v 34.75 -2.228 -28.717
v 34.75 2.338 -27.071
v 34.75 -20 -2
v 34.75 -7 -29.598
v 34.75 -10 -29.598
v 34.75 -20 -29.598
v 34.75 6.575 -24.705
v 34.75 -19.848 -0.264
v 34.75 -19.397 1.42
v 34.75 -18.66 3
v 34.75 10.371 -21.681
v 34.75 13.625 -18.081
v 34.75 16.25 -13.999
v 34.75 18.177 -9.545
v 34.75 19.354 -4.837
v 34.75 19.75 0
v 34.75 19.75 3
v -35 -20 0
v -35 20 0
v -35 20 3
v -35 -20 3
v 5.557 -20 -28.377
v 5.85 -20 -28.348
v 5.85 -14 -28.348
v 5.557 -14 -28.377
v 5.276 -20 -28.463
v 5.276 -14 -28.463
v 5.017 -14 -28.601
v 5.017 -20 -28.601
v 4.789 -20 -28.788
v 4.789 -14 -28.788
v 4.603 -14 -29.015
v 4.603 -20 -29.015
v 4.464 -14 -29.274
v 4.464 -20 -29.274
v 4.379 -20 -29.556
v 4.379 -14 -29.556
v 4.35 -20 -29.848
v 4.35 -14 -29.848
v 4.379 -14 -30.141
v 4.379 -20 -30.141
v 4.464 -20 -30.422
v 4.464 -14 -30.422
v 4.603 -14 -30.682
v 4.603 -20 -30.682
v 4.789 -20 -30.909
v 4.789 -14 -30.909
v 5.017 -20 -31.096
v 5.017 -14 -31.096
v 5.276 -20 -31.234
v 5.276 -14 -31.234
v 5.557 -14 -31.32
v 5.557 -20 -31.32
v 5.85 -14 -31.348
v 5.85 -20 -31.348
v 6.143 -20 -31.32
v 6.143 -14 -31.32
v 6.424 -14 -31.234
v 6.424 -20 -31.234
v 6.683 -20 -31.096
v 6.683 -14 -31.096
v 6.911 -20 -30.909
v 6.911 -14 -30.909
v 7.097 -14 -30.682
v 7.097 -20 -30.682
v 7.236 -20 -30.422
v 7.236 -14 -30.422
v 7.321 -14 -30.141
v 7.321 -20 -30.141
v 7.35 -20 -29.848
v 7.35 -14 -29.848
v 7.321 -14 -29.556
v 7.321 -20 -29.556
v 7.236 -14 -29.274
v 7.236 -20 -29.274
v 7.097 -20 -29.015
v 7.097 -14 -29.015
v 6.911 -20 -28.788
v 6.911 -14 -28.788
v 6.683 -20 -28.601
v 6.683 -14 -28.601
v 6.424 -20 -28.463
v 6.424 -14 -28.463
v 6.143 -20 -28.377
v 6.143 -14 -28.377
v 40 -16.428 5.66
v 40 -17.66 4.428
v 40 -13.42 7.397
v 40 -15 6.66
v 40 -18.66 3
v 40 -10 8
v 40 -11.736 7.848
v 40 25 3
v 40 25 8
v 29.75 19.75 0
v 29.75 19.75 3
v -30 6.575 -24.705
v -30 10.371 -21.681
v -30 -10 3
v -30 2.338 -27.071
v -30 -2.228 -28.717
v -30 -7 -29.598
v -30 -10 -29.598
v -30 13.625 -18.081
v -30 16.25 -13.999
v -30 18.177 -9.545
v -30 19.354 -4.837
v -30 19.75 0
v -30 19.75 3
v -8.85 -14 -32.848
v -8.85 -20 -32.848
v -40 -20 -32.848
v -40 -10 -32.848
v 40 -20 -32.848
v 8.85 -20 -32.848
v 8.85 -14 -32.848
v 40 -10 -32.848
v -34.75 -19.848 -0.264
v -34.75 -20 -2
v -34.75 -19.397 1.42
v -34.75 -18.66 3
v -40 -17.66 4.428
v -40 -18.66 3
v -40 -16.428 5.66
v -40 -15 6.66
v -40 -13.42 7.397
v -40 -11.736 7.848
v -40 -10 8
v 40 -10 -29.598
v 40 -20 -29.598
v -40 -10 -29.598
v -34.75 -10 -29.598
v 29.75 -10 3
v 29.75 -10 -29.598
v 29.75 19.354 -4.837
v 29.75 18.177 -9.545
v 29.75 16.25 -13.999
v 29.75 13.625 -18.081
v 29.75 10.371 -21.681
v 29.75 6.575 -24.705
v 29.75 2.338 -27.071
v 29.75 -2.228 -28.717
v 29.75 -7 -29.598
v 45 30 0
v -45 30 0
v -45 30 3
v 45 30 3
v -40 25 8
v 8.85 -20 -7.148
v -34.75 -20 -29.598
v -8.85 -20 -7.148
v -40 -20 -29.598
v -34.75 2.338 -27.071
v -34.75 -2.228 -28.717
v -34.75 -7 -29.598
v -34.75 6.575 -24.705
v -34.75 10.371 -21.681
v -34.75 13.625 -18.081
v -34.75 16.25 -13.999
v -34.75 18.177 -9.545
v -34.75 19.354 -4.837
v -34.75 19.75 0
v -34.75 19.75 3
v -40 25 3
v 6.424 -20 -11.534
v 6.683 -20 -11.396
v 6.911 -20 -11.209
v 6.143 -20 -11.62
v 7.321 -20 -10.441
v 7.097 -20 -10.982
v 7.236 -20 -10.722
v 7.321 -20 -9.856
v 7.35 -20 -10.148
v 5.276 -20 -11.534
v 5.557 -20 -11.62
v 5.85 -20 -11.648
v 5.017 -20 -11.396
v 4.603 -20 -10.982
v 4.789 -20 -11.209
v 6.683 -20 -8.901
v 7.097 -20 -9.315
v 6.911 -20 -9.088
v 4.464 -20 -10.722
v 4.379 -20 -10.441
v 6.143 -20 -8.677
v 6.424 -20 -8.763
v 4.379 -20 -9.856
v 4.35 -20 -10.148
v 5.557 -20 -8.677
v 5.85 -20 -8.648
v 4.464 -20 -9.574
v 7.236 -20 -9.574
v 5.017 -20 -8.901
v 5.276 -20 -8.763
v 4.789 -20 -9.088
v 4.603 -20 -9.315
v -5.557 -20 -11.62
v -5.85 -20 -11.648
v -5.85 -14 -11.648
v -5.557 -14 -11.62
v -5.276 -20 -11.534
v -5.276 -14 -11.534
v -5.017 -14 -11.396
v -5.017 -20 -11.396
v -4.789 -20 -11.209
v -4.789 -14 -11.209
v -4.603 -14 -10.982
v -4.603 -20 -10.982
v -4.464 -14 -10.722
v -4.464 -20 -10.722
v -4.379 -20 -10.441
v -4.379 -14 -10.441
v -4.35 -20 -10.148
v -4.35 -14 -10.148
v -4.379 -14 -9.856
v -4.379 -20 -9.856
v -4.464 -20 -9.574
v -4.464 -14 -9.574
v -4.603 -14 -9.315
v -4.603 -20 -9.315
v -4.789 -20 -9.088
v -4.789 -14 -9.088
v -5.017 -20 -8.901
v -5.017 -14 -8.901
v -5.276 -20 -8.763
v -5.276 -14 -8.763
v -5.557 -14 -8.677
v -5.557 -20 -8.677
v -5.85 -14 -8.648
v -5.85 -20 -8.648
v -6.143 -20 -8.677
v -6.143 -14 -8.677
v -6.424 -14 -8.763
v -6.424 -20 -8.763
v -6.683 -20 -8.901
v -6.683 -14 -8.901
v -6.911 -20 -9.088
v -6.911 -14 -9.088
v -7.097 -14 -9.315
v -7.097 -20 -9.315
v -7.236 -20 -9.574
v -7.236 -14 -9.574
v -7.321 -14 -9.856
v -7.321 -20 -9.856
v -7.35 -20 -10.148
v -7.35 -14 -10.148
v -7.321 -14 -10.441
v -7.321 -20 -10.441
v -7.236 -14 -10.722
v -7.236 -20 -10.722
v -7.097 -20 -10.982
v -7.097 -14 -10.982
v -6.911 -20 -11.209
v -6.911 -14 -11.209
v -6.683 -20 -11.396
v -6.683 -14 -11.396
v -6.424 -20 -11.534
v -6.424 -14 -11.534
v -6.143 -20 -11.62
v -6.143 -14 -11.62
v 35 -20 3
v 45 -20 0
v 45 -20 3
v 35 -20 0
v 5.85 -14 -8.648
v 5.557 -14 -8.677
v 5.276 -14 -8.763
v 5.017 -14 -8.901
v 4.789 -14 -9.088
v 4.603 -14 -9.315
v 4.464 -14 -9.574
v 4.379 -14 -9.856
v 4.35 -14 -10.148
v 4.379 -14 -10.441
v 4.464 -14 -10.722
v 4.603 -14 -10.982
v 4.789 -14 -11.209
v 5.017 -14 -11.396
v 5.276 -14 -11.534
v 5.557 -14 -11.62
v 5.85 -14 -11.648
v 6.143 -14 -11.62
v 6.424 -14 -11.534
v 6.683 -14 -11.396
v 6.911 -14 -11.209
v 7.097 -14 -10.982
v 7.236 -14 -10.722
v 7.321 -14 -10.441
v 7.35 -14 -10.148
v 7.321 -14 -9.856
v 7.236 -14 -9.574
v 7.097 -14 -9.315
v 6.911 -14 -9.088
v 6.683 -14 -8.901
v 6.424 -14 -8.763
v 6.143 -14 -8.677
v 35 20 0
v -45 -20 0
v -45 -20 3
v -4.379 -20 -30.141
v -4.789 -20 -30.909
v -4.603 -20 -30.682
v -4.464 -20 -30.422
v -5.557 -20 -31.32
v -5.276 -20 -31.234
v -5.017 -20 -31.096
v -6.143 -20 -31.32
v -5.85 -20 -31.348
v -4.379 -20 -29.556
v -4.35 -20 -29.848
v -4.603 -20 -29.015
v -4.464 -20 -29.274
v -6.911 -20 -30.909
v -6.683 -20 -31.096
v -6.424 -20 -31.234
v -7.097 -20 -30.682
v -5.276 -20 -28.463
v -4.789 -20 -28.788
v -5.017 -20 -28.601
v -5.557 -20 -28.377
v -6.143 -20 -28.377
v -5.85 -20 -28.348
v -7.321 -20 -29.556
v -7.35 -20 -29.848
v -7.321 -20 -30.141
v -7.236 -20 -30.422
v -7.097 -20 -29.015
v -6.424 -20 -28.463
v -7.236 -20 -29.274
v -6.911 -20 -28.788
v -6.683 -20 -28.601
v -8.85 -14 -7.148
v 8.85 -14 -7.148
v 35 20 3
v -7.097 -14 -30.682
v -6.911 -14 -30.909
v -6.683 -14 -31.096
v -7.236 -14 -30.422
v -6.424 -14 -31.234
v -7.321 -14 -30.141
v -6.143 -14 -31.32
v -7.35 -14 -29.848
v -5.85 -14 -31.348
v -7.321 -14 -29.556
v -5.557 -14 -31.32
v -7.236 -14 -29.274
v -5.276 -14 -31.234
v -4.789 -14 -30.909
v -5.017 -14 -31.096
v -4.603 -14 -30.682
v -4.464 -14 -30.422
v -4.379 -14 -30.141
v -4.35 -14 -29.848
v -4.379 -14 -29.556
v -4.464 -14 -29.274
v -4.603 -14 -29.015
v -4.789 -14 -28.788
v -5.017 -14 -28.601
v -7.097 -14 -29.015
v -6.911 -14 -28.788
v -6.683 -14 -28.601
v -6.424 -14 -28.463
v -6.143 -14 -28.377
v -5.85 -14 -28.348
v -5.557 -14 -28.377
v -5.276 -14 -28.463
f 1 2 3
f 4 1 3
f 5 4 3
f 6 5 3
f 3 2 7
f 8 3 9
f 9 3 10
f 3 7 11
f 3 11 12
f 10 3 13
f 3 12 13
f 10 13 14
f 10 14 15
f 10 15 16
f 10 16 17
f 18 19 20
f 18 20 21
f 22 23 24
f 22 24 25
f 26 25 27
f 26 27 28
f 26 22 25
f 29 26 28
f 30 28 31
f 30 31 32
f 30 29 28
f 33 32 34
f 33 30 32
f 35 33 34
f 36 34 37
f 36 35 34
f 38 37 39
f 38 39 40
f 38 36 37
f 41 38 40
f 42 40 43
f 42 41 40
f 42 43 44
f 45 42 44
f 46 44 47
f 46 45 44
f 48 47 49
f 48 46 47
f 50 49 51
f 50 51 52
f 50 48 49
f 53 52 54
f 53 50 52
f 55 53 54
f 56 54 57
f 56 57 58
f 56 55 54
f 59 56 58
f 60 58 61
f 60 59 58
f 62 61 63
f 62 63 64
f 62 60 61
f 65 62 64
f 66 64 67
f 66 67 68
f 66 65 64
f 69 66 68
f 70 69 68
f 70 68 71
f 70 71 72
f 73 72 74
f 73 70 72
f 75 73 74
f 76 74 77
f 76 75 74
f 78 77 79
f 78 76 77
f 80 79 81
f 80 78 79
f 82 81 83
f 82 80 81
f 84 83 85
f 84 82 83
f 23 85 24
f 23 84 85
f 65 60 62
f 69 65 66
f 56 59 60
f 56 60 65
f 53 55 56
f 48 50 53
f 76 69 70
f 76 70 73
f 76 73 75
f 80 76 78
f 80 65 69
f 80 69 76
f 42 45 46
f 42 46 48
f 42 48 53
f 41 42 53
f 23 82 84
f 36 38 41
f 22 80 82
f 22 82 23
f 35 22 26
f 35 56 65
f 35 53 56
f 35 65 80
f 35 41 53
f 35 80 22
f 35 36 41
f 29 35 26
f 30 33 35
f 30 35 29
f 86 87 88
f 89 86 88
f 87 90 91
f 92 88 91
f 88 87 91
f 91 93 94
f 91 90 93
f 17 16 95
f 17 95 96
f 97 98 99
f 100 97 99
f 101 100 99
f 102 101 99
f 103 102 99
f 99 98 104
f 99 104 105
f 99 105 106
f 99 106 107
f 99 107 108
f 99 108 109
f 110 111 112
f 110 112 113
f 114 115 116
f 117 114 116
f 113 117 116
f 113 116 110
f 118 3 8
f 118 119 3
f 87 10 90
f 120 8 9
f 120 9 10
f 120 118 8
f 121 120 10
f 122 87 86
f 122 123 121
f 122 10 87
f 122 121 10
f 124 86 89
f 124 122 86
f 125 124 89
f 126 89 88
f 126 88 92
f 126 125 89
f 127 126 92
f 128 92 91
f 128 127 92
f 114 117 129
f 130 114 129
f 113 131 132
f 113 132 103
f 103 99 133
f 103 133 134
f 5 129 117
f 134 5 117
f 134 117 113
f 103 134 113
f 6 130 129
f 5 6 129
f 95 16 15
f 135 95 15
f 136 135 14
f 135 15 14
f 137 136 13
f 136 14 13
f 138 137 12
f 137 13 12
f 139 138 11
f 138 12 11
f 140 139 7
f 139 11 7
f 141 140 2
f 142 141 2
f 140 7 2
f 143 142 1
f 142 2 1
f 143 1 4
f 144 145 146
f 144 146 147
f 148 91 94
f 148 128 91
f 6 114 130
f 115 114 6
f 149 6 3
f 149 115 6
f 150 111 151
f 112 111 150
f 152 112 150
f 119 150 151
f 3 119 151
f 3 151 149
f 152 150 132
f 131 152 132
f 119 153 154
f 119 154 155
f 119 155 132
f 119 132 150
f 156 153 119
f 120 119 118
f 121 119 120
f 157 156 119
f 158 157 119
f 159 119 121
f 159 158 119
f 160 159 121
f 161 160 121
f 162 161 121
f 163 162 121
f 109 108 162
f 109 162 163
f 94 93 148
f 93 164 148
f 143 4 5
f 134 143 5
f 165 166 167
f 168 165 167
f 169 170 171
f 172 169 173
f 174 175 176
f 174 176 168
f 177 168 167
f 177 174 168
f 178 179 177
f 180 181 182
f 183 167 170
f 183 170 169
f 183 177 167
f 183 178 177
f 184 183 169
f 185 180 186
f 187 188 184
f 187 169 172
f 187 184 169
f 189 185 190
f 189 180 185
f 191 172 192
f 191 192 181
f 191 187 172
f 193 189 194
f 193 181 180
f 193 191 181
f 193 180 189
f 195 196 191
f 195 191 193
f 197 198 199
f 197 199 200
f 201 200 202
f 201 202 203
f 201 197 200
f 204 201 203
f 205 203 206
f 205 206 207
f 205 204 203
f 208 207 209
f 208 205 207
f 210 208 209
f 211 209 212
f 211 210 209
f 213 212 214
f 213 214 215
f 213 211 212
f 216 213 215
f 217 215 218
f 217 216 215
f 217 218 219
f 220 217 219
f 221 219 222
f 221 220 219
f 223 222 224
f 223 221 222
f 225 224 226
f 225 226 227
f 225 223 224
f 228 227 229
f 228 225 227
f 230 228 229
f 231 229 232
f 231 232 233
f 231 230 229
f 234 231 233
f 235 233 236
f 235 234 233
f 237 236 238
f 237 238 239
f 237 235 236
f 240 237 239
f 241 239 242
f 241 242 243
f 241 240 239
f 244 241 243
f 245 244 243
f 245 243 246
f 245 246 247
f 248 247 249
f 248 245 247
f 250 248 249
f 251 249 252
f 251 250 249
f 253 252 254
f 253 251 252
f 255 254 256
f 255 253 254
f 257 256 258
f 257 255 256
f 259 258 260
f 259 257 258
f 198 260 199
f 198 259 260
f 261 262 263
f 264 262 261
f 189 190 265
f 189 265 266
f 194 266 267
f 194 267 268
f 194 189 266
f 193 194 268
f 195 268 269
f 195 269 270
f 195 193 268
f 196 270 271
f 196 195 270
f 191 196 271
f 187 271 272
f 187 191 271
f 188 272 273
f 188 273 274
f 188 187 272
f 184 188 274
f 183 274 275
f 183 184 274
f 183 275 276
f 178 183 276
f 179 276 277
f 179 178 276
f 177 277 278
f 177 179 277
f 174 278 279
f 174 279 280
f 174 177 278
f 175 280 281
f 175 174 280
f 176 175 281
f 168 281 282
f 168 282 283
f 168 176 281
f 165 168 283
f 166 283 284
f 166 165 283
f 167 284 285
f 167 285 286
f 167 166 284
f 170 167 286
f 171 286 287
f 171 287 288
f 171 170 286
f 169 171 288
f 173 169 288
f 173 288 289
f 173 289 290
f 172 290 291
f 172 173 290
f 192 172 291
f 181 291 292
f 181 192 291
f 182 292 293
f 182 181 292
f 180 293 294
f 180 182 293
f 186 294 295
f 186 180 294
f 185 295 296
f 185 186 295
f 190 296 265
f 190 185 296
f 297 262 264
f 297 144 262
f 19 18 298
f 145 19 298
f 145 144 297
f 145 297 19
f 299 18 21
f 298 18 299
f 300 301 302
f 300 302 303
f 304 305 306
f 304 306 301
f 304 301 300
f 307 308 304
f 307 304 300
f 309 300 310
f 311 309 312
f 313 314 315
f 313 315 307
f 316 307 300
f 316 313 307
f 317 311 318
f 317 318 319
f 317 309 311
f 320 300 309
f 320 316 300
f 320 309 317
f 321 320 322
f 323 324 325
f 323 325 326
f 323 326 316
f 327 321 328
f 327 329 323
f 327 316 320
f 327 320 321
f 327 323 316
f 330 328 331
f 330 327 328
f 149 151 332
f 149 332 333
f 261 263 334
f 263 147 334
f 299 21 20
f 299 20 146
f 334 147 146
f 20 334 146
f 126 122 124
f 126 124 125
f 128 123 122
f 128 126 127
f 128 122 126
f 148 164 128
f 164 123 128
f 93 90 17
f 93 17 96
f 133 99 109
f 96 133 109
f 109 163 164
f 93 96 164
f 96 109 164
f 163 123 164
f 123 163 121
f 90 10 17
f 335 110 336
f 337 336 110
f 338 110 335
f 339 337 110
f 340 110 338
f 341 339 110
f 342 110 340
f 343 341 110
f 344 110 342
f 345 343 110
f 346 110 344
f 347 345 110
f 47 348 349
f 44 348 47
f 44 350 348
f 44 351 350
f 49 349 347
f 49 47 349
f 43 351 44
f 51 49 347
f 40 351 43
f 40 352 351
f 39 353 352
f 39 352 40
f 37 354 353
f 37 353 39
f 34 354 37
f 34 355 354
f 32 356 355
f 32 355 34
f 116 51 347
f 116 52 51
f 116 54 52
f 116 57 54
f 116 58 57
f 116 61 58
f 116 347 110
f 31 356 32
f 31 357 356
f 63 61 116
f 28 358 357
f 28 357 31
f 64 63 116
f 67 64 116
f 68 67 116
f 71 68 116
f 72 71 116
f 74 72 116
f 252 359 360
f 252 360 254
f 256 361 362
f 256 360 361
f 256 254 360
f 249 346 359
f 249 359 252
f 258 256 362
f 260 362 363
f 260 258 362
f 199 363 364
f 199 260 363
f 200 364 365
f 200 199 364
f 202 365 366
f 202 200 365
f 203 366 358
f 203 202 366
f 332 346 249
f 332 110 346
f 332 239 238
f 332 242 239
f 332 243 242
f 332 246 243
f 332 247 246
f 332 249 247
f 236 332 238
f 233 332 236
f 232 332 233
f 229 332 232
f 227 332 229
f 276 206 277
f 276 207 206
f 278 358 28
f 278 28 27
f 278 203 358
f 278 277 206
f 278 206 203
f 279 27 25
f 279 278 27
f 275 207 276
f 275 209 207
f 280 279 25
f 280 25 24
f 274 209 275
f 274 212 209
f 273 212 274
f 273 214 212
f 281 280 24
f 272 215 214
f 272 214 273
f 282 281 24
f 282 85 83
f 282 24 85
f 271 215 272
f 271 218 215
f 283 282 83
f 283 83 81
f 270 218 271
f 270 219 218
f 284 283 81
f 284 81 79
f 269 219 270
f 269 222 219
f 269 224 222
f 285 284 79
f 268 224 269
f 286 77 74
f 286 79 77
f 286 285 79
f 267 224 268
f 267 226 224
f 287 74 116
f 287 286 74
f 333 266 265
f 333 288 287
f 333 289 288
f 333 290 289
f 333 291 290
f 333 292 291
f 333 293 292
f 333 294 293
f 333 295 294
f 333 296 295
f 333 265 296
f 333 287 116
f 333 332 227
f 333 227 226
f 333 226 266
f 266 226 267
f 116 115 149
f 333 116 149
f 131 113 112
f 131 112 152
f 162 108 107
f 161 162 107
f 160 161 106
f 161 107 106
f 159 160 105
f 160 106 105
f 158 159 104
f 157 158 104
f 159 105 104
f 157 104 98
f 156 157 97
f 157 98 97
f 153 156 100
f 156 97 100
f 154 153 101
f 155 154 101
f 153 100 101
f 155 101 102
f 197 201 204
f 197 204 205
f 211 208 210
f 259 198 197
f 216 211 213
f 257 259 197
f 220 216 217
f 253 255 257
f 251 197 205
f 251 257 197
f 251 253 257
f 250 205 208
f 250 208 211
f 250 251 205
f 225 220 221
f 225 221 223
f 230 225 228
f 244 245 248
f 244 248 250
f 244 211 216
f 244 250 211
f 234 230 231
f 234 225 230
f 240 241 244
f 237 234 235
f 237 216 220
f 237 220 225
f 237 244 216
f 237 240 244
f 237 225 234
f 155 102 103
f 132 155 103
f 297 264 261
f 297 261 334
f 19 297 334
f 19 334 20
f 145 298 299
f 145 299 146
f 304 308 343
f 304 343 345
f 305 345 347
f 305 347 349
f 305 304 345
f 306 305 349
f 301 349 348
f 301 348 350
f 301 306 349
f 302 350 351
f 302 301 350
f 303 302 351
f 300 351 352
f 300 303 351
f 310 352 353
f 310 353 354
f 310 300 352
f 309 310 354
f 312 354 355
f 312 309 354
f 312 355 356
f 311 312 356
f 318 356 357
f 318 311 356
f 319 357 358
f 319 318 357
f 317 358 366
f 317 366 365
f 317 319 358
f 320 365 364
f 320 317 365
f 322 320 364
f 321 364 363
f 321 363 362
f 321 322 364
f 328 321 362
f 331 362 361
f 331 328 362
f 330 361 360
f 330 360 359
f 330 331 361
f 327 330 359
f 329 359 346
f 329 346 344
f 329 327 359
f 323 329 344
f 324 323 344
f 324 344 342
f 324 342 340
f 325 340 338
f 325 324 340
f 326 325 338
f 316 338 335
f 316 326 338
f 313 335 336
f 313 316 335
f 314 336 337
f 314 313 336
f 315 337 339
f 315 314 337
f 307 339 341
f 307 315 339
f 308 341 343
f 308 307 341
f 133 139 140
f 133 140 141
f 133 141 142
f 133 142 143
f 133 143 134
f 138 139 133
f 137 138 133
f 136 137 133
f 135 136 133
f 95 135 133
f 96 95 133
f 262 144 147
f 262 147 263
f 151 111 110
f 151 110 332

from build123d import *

# Parameters (mm, degrees)
BOSS_EXTRUDE1_DEPTH      = 3
BOSS_EXTRUDE2_START      = 0.25
SKETCH2_W                = 3
SKETCH2_H                = 29.75
BOSS_EXTRUDE2_DEPTH      = 5
SKETCH2_6_W              = 5
SKETCH2_6_H              = 45
SKETCH2_6_W_2            = 3.25
SKETCH2_6_H_2            = 10
BOSS_EXTRUDE5_DEPTH      = 75
BOSS_EXTRUDE5_DEPTH_BACK = 5
BOSS_EXTRUDE6_START      = 65
SKETCH2_8_W              = 3
SKETCH2_8_H              = 29.75
BOSS_EXTRUDE6_DEPTH      = 4.75
BOSS_EXTRUDE8_START      = 0.25
SKETCH2_9_W              = 3
SKETCH2_9_H              = 10
SKETCH2_9_W_2            = 29.598352995
BOSS_EXTRUDE8_DEPTH      = 69.5
FILLET1_R                = 10
SKETCH3_W                = 17.7
SKETCH3_H                = 25.7
SKETCH3_R                = 1.5
CUT_EXTRUDE1_DEPTH       = 6


with BuildPart() as part:
    # Sketch1 → Boss-Extrude1 (new body)
    with BuildSketch(Plane.XY):
        Polygon((45, -20), (35, -20), (35, 20), (-35, 20), (-35, -20), (-45, -20), (-45, 30), (45, 30), align=None)
    extrude(amount=BOSS_EXTRUDE1_DEPTH)


with BuildPart() as body_2:
    # Sketch2 → Boss-Extrude2 (new body)
    with BuildSketch(Plane.ZY.offset(-35).offset(BOSS_EXTRUDE2_START)):
        with BuildLine():
            Line((-29.598352995, -10), (0, -10))
            Line((0, -10), (0, 19.75))
            ThreePointArc((0, 19.75), (-19.947587573, 12.071616388), (-29.598352995, -7))
            Line((-29.598352995, -7), (-29.598352995, -10))
        make_face()
        with Locations((1.5, 4.875)):
            Rectangle(SKETCH2_W, SKETCH2_H)
    extrude(amount=BOSS_EXTRUDE2_DEPTH)

    # Sketch2_6 → Boss-Extrude5 (add, two sides)
    with BuildSketch(Plane.ZY.offset(-35)) as boss_extrude5_sk:
        with Locations((5.5, 2.5)):
            Rectangle(SKETCH2_6_W, SKETCH2_6_H)
        with Locations((-31.223352995, -15)):
            Rectangle(SKETCH2_6_W_2, SKETCH2_6_H_2)
    extrude(amount=BOSS_EXTRUDE5_DEPTH)
    extrude(boss_extrude5_sk.sketch, amount=-BOSS_EXTRUDE5_DEPTH_BACK)

    # Sketch2_8 → Boss-Extrude6 (add)
    with BuildSketch(Plane.ZY.offset(-35).offset(BOSS_EXTRUDE6_START)):
        with BuildLine():
            Line((-29.598352995, -10), (0, -10))
            Line((0, -10), (0, 19.75))
            ThreePointArc((0, 19.75), (-19.947587573, 12.071616388), (-29.598352995, -7))
            Line((-29.598352995, -7), (-29.598352995, -10))
        make_face()
        with Locations((1.5, 4.875)):
            Rectangle(SKETCH2_8_W, SKETCH2_8_H)
    extrude(amount=BOSS_EXTRUDE6_DEPTH)

    # Sketch2_9 → Boss-Extrude8 (add)
    with BuildSketch(Plane.ZY.offset(-35).offset(BOSS_EXTRUDE8_START)):
        with Locations((1.5, -15)):
            Rectangle(SKETCH2_9_W, SKETCH2_9_H)
        with Locations((-14.799176498, -15)):
            Rectangle(SKETCH2_9_W_2, SKETCH2_9_H)
    extrude(amount=BOSS_EXTRUDE8_DEPTH)

    # Fillet1
    fillet1_edges = [body_2.edges().sort_by_distance(p)[0] for p in [
        (0, -20, 8),
    ]]
    fillet(fillet1_edges, radius=FILLET1_R)

    # Sketch3 → Cut-Extrude1 (cut)
    with BuildSketch(Plane.XZ.offset(20)):
        with Locations((0, -19.998352995)):
            Rectangle(SKETCH3_W, SKETCH3_H)
        with Locations(Location((-5.85, -10.148352995, 0), (0, 0, 270))):  # turned: the seam where the file's is
            Circle(SKETCH3_R, mode=Mode.SUBTRACT)
        with Locations(Location((-5.85, -29.848352995, 0), (0, 0, 270))):  # turned: the seam where the file's is
            Circle(SKETCH3_R, mode=Mode.SUBTRACT)
        with Locations(Location((5.85, -29.848352995, 0), (0, 0, 90))):  # turned: the seam where the file's is
            Circle(SKETCH3_R, mode=Mode.SUBTRACT)
        with Locations(Location((5.85, -10.148352995, 0), (0, 0, 90))):  # turned: the seam where the file's is
            Circle(SKETCH3_R, mode=Mode.SUBTRACT)
    extrude(amount=-CUT_EXTRUDE1_DEPTH, mode=Mode.SUBTRACT)


solid = Compound([part.part, body_2.part])
